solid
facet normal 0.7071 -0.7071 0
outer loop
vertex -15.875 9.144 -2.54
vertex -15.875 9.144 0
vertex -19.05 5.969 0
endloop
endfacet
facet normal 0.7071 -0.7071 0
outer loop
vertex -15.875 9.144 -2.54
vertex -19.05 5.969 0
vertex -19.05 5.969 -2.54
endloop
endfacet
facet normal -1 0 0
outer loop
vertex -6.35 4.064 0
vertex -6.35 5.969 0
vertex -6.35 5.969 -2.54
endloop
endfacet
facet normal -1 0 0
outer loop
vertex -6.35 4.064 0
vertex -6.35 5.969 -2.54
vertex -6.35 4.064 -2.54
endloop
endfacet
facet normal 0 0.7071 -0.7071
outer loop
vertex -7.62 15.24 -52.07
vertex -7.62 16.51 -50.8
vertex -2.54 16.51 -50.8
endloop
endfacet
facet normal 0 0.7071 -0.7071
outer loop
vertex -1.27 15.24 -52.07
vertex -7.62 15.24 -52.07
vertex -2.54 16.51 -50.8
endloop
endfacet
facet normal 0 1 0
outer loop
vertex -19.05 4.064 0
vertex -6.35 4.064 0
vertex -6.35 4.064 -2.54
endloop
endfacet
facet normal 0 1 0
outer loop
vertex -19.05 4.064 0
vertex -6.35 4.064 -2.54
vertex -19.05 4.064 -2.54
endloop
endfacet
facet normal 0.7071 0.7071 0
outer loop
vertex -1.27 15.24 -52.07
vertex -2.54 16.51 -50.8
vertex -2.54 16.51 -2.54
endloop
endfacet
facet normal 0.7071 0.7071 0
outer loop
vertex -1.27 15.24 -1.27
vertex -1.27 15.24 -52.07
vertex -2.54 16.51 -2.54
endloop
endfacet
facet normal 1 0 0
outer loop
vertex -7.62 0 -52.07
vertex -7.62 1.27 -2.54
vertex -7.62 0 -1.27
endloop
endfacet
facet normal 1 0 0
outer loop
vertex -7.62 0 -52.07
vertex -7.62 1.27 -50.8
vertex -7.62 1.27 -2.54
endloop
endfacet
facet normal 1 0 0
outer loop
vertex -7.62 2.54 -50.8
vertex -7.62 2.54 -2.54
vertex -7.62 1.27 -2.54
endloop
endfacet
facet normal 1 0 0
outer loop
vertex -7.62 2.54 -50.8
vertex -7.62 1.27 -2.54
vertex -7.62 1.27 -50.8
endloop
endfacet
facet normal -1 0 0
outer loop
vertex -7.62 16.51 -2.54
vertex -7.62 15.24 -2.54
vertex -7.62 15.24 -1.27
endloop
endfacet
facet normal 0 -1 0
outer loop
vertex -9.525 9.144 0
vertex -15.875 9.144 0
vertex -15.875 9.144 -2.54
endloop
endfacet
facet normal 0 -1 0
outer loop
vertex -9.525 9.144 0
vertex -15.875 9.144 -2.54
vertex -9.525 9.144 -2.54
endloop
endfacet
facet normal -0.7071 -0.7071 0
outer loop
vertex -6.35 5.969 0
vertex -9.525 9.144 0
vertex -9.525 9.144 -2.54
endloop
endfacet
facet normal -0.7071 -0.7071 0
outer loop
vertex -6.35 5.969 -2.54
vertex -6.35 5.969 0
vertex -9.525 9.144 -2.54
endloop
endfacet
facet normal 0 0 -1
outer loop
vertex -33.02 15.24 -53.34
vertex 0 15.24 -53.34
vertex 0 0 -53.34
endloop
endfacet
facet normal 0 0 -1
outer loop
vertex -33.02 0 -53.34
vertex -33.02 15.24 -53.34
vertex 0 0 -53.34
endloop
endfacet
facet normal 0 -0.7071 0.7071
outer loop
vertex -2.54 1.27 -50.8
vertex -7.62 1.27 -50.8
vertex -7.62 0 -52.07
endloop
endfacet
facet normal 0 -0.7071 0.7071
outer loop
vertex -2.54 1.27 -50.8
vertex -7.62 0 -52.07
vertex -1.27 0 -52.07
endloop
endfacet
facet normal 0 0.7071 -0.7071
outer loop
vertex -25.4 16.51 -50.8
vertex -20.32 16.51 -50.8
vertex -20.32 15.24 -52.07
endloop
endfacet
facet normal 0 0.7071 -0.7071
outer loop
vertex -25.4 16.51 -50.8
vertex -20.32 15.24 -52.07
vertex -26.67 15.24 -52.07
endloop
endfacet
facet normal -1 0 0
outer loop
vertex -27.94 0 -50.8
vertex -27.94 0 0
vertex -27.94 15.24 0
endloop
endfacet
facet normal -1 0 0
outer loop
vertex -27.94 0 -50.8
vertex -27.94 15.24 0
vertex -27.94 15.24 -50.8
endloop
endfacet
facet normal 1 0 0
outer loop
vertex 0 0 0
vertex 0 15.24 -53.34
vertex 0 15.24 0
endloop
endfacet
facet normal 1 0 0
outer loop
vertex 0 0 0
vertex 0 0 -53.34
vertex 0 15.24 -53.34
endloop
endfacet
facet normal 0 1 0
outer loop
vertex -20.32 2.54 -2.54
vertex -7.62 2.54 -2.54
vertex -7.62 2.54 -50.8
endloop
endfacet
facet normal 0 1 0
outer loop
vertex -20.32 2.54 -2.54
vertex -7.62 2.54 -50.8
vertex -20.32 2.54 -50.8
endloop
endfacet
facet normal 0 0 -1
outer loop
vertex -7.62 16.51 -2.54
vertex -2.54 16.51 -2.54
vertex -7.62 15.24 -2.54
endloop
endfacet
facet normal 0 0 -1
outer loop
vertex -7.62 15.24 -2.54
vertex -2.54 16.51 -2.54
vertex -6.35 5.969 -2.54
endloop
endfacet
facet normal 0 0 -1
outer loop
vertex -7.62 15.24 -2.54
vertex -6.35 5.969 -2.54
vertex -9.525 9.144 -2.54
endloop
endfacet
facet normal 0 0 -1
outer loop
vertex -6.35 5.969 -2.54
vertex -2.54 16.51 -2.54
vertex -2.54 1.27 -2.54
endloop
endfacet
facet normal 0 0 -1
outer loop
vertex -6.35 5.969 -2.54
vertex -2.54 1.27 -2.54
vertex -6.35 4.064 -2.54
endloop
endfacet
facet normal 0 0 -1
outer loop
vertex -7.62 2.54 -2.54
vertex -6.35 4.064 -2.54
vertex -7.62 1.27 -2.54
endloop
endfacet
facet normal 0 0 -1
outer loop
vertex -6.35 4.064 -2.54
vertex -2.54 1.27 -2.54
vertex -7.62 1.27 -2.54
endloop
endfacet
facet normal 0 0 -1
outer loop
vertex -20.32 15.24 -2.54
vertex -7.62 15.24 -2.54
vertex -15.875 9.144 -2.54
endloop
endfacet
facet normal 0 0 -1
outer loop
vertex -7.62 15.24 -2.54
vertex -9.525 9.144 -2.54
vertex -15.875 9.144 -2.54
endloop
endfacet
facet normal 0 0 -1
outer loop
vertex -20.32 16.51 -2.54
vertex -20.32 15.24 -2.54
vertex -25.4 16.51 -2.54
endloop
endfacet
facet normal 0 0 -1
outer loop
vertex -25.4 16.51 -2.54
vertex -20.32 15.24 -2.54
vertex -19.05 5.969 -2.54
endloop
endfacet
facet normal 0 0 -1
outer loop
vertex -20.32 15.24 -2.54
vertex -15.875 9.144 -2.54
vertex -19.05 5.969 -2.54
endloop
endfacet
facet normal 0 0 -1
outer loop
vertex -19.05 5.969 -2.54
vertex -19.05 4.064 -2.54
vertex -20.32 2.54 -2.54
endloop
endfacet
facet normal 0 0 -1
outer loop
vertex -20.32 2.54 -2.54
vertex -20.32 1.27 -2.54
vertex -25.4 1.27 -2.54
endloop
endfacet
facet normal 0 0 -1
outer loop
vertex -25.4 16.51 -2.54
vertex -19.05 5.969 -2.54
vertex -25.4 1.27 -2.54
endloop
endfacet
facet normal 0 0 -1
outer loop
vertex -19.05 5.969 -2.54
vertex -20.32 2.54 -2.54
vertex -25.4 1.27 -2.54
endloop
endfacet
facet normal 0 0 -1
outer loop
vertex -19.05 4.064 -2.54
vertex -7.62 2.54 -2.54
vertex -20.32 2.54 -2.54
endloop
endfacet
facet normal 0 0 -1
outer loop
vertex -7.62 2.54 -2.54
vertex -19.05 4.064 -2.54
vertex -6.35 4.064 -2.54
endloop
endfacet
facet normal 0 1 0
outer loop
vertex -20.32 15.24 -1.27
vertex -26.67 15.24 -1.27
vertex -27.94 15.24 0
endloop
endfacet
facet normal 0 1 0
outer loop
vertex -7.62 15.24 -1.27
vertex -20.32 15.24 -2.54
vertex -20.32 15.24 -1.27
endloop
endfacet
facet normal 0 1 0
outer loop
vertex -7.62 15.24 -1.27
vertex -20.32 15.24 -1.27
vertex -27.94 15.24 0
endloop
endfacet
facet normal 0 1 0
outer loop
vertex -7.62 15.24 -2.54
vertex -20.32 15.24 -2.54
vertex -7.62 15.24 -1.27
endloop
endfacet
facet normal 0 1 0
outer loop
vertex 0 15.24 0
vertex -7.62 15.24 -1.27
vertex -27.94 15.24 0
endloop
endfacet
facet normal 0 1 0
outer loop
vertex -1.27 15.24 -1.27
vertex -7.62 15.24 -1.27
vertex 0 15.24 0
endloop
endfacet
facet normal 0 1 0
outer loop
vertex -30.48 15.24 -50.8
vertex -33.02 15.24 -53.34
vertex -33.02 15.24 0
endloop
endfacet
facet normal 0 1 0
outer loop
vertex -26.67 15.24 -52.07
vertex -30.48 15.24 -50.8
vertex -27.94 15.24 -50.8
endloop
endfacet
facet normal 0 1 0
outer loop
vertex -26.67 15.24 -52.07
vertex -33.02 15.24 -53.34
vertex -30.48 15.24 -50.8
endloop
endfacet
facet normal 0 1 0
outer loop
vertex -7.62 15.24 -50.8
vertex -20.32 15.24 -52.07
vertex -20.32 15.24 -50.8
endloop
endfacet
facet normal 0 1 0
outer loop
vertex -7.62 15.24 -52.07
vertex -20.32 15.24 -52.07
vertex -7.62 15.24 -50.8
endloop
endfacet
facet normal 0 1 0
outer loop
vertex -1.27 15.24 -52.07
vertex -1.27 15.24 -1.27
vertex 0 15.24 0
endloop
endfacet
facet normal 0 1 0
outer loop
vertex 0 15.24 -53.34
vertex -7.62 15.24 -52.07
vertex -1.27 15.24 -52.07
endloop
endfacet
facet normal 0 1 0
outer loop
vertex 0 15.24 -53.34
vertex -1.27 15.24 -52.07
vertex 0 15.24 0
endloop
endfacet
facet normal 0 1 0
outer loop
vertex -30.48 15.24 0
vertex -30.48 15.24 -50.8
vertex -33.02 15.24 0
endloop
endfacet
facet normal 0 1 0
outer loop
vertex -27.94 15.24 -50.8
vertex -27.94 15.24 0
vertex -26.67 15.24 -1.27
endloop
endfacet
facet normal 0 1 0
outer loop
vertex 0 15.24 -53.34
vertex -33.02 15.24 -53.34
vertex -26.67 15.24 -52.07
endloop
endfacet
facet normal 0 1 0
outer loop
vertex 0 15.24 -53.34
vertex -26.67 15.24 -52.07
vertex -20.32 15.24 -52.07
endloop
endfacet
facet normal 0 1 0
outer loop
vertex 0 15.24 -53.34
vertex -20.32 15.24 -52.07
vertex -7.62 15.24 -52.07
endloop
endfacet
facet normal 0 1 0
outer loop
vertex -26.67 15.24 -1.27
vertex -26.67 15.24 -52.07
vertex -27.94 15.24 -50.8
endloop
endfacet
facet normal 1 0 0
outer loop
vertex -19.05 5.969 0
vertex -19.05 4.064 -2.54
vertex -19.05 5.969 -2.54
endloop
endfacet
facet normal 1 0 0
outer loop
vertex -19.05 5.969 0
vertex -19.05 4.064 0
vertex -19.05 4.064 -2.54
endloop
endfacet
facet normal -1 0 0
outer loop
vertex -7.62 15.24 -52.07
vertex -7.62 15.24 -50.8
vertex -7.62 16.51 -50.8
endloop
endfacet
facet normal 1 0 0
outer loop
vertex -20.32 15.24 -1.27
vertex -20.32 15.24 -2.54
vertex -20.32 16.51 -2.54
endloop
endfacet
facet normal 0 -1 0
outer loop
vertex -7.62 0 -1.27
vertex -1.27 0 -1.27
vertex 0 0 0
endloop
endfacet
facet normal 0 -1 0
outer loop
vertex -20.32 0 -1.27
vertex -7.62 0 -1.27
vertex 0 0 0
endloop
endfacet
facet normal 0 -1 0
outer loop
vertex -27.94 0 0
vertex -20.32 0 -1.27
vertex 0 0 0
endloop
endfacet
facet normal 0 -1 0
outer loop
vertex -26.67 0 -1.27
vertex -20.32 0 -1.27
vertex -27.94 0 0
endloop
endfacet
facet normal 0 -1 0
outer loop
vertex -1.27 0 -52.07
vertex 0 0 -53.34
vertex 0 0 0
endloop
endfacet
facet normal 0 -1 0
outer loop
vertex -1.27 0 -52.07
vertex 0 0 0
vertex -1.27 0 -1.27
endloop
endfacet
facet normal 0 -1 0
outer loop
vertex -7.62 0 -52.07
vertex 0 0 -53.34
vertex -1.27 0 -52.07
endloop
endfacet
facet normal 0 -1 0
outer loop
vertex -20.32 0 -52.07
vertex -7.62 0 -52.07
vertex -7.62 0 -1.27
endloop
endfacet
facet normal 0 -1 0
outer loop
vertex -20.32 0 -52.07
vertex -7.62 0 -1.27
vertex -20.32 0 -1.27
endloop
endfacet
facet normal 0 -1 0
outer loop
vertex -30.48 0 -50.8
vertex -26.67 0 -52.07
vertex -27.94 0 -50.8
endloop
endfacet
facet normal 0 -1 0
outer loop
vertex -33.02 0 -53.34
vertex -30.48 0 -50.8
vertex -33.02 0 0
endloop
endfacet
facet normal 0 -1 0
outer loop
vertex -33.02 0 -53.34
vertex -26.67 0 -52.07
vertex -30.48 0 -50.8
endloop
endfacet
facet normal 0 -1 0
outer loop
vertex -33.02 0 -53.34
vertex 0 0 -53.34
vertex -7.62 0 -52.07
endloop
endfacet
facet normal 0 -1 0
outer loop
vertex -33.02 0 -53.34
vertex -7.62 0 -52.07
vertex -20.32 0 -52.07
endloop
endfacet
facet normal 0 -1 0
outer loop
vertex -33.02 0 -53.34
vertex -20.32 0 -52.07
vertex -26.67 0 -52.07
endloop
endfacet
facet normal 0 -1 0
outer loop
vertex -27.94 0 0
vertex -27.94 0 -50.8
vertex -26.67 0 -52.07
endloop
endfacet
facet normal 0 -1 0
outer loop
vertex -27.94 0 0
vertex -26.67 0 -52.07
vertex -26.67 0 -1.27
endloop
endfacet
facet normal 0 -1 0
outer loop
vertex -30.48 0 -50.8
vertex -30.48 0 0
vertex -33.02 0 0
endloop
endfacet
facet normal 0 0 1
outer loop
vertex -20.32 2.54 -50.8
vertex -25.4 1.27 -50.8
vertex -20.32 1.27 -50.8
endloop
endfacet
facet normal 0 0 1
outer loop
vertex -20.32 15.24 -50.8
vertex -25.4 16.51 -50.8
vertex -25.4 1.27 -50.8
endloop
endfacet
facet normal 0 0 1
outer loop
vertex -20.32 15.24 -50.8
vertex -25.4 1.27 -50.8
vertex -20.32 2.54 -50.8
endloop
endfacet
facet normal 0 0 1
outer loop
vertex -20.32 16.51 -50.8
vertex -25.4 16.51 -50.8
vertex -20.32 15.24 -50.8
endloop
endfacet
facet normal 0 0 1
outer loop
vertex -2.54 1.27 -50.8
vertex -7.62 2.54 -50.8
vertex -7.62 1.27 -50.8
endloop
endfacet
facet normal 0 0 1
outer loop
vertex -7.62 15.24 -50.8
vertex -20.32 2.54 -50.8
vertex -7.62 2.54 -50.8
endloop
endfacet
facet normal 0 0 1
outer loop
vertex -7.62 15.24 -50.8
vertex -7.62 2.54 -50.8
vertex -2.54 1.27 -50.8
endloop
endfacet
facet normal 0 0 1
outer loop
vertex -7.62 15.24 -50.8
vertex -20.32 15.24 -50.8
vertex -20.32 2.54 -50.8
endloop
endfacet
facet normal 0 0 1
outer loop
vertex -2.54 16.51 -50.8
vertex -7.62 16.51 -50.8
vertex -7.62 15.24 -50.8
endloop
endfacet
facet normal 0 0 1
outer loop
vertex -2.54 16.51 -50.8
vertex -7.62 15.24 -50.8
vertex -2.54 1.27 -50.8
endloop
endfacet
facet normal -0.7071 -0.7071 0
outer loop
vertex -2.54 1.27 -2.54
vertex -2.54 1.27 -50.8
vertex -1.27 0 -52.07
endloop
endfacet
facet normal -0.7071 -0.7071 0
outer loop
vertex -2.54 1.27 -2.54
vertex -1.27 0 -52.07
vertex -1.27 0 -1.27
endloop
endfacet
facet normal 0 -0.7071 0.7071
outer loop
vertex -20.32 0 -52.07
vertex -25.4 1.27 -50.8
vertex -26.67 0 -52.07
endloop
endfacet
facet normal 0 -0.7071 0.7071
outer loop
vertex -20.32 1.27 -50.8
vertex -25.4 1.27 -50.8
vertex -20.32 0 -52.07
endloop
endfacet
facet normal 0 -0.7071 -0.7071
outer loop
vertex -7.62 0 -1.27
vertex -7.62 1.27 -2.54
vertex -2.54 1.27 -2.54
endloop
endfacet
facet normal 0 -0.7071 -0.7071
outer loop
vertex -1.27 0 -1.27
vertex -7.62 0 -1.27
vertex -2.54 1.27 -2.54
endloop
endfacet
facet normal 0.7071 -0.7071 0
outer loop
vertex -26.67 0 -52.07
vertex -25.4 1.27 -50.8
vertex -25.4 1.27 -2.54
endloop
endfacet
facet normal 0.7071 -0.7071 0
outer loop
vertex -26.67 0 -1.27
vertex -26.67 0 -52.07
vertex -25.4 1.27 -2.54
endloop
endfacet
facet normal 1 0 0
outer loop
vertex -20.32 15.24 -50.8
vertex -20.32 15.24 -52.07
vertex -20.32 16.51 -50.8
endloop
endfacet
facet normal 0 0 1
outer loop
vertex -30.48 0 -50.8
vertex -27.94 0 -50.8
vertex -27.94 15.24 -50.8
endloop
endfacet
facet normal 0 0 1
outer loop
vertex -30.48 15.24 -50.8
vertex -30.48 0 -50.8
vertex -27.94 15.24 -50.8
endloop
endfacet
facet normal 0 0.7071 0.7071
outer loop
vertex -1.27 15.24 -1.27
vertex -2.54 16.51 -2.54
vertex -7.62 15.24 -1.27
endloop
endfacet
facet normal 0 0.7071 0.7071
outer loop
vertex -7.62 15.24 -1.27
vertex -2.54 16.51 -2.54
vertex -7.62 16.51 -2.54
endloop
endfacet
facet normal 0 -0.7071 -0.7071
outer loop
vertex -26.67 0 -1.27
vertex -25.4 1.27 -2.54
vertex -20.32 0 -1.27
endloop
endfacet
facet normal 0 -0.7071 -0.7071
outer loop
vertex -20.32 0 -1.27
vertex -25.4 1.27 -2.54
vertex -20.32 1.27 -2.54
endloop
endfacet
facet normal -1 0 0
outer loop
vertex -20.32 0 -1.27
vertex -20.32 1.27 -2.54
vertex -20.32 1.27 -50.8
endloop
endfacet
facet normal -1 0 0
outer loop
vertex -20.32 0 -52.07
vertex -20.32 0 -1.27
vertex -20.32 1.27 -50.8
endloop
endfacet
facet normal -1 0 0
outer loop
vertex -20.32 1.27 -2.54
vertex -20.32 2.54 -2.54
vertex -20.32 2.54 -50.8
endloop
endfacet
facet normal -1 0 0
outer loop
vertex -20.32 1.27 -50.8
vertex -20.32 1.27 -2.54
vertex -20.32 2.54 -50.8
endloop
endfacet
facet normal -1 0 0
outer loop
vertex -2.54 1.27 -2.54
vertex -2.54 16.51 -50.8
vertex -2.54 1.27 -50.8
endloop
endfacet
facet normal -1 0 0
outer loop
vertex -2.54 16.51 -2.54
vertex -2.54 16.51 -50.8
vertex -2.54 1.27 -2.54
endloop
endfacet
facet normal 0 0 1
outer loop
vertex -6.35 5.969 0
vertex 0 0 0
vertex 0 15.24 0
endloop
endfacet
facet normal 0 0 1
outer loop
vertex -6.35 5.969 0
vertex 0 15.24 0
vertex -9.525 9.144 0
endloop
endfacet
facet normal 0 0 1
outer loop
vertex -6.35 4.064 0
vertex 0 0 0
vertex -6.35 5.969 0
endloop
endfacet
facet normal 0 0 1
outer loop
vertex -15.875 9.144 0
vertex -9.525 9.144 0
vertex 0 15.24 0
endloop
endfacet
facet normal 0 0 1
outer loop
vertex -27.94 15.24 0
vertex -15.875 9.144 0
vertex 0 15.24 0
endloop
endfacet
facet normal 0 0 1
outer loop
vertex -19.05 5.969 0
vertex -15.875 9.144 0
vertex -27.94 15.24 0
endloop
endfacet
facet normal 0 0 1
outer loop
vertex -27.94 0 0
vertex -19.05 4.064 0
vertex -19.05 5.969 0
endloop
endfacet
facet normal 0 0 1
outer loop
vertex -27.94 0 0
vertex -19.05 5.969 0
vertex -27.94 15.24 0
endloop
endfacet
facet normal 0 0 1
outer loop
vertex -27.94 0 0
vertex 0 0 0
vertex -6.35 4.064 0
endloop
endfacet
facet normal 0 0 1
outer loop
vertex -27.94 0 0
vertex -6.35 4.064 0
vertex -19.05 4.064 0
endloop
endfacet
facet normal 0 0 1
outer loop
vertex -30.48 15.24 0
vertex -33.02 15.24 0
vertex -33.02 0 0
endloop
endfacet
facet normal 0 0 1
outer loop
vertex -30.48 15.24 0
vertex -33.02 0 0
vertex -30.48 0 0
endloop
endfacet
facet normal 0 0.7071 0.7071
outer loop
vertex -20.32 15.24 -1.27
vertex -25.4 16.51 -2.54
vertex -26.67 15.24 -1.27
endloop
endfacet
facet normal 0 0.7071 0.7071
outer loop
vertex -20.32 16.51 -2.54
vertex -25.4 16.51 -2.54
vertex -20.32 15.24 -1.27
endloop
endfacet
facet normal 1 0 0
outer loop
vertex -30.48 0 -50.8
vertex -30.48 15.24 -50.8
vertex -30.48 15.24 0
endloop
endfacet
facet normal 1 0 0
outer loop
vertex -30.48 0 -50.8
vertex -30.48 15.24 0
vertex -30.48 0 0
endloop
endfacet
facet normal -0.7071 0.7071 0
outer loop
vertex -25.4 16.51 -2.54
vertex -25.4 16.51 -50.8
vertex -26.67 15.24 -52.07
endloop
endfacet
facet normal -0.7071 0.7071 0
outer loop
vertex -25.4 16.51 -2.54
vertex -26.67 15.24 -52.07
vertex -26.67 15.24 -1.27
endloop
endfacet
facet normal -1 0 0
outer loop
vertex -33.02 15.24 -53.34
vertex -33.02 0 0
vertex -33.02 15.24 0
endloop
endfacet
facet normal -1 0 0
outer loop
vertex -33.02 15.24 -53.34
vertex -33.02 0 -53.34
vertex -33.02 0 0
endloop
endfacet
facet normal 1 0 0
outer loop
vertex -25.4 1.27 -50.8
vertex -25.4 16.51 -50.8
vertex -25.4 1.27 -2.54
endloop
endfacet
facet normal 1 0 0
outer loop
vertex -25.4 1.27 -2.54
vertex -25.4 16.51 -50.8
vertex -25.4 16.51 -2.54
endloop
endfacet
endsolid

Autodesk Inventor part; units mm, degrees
ref_plane "YZ Plane" through (0, 0, 0) normal (1, 0, 0) x (0, 1, 0)
ref_plane "XZ Plane" through (0, 0, 0) normal (0, 1, 0) x (-1, 0, 0)
ref_plane "XY Plane" through (0, 0, 0) normal (0, 0, 1) x (1, 0, 0)
sketch "Sketch1" plane through (0, 0, 0) normal (0, 1, 0) x (-1, 0, 0)
  line L0 (0, 0) -> (27.94, 0)
  line L1 (27.94, 0) -> (27.94, -53.34)
  line L2 (27.94, -53.34) -> (0, -53.34)
  line L3 (0, -53.34) -> (0, 0)
  dimension "d0" = 27.94
  dimension "d1" = 53.34
extrude "Extrusion1" add sketch "Sketch1" along normal blind 15.24
shell "Shell1" thickness 2.54 removed faces 1 at (-9.3133, 15.24, -17.78)
sketch "Sketch3" plane through (-27.94, 0, 0) normal (0, 0, 1) x (1, 0, 0)
  line L0 (21.59, 4.064) -> (8.89, 4.064)
  line L1 (8.89, 4.064) -> (8.89, 9.144)
  line L2 (8.89, 9.144) -> (21.59, 9.144)
  line L3 (21.59, 9.144) -> (21.59, 4.064)
  point P0 (27.94, 0)
  dimension "d20" = 4.064
  dimension "d21" = 12.7
  dimension "d22" = 5.08
  dimension "d23" = 6.35
extrude "Extrusion3" cut sketch "Sketch3" against normal blind 2.54
chamfer "Chamfer1" distance 3.175 angle 45 2 edges at (-19.05, 9.144, -1.27) (-6.35, 9.144, -1.27)
sketch "Sketch5" plane through (-25.4, 2.54, -2.54) normal (0, 1, 0) x (1, 0, 0)
  line L0 (0, 0) -> (5.08, 0)
  line L1 (5.08, 0) -> (5.08, 48.26)
  line L2 (5.08, 48.26) -> (0, 48.26)
  line L3 (0, 48.26) -> (0, 0)
  line L4 (0, 48.26) -> (22.86, 48.26) projected
  line L5 (22.86, 0) -> (17.78, 0)
  line L6 (17.78, 0) -> (17.78, 48.26)
  line L7 (17.78, 48.26) -> (22.86, 48.26)
  line L8 (22.86, 48.26) -> (22.86, 0)
  point P0 (25.4, -2.54)
  dimension "d29" = 5.08
  dimension "d30" = 5.08
extrude "Extrusion4" cut sketch "Sketch5" against normal blind 2.54
sketch "Sketch6" plane through (-27.94, 0, -53.34) normal (-1, 0, 0) x (0, 0, 1)
  point P0 (53.34, 0)
sketch "Sketch7" plane through (-27.94, 0, -53.34) normal (-1, 0, 0) x (0, 0, 1)
  line L0 (2.54, 15.24) -> (50.8, 15.24) projected
  line L1 (0, 0) -> (2.54, 0)
  line L2 (2.54, 0) -> (2.54, 15.24)
  line L3 (2.54, 15.24) -> (0, 15.24)
  line L4 (0, 15.24) -> (0, 0)
  point P0 (53.34, 0)
  dimension "d33" = 2.54
extrude "Extrusion5" add sketch "Sketch7" along normal blind 5.08
sketch "Sketch8" plane through (-27.94, 0, -50.8) normal (0, 0, 1) x (1, 0, 0)
  line L0 (-5.08, 15.24) -> (-2.54, 15.24)
  line L1 (-2.54, 15.24) -> (-2.54, 0)
  line L2 (-2.54, 0) -> (-5.08, 0)
  line L3 (-5.08, 0) -> (-5.08, 15.24)
  point P0 (27.94, 0)
  dimension "d36" = 2.54
extrude "Extrusion6" add sketch "Sketch8" along normal up to surface (50.8 mm away)
chamfer "Chamfer2" distance 1.27 angle 45 6 edges at (-2.54, 0, -26.67) (-5.08, 0, -2.54) (-5.08, 0, -50.8) (-22.86, 0, -2.54) (-25.4, 0, -26.67) (-22.86, 0, -50.8)
sketch "Sketch11" plane through (0, 15.24, 0) normal (0, 1, 0) x (1, 0, 0)
  line L0 (-26.67, 52.07) -> (-17.78, 52.07)
  line L1 (-20.32, 1.27) -> (-26.67, 1.27)
  line L2 (-26.67, 1.27) -> (-26.67, 52.07)
  line L3 (-25.4, 2.54) -> (-25.4, 50.8) projected
  line L4 (-2.54, 2.54) -> (-25.4, 2.54) projected
  line L5 (-25.4, 50.8) -> (-2.54, 50.8) projected
  line L6 (-1.27, 52.07) -> (-7.62, 52.07)
  line L7 (-7.62, 1.27) -> (-1.27, 1.27)
  line L8 (-1.27, 1.27) -> (-1.27, 52.07)
  line L9 (-2.54, 50.8) -> (-2.54, 2.54) projected
  line L10 (-7.62, 52.07) -> (-1.27, 52.07)
  line L11 (-1.27, 52.07) -> (-1.27, 50.8)
  line L12 (-1.27, 50.8) -> (-7.62, 50.8)
  line L13 (-7.62, 50.8) -> (-7.62, 52.07)
  line L14 (-2.54, 50.8) -> (-1.27, 50.8)
  line L15 (-1.27, 50.8) -> (-1.27, 1.27)
  line L16 (-1.27, 1.27) -> (-2.54, 1.27)
  line L17 (-2.54, 1.27) -> (-2.54, 50.8)
  line L18 (-2.54, 2.54) -> (-7.62, 2.54)
  line L19 (-7.62, 2.54) -> (-7.62, 1.27)
  line L20 (-7.62, 1.27) -> (-2.54, 1.27)
  line L21 (-2.54, 1.27) -> (-2.54, 2.54)
  line L22 (-26.67, 52.07) -> (-20.32, 52.07)
  line L23 (-20.32, 52.07) -> (-20.32, 50.8)
  line L24 (-20.32, 50.8) -> (-26.67, 50.8)
  line L25 (-26.67, 50.8) -> (-26.67, 52.07)
  line L26 (-25.4, 50.8) -> (-26.67, 50.8)
  line L27 (-26.67, 50.8) -> (-26.67, 1.27)
  line L28 (-26.67, 1.27) -> (-25.4, 1.27)
  line L29 (-25.4, 1.27) -> (-25.4, 50.8)
  line L30 (-25.4, 2.54) -> (-20.32, 2.54)
  line L31 (-20.32, 2.54) -> (-20.32, 1.27)
  line L32 (-20.32, 1.27) -> (-25.4, 1.27)
  line L33 (-25.4, 1.27) -> (-25.4, 2.54)
  point P0 (0, 0)
  dimension "d50" = 1.27
  dimension "d51" = 1.27
  dimension "d52" = 1.27
  dimension "d55" = 1.27
  dimension "d57" = 1.27
  dimension "d58" = 5.08
  dimension "d59" = 48.26
  dimension "d60" = 6.35
  dimension "d61" = 6.35
extrude "Extrusion8" add sketch "Sketch11" along normal blind 1.27 contours L0 L23 L5 L24 L2 | L24 L3 L29 L1 L2 | L13 L6 L8 L12 L5 | L29 L4 L31 L1 | L12 L8 L7 L17 L9 | L17 L7 L19 L4
chamfer "Chamfer3" distance 1.27 angle 45 6 edges at (-1.27, 16.51, -26.67) (-4.445, 16.51, -1.27) (-4.445, 16.51, -52.07) (-23.495, 16.51, -52.07) (-26.67, 16.51, -26.67) (-23.495, 16.51, -1.27)
properties part number "nano_enclosure"
